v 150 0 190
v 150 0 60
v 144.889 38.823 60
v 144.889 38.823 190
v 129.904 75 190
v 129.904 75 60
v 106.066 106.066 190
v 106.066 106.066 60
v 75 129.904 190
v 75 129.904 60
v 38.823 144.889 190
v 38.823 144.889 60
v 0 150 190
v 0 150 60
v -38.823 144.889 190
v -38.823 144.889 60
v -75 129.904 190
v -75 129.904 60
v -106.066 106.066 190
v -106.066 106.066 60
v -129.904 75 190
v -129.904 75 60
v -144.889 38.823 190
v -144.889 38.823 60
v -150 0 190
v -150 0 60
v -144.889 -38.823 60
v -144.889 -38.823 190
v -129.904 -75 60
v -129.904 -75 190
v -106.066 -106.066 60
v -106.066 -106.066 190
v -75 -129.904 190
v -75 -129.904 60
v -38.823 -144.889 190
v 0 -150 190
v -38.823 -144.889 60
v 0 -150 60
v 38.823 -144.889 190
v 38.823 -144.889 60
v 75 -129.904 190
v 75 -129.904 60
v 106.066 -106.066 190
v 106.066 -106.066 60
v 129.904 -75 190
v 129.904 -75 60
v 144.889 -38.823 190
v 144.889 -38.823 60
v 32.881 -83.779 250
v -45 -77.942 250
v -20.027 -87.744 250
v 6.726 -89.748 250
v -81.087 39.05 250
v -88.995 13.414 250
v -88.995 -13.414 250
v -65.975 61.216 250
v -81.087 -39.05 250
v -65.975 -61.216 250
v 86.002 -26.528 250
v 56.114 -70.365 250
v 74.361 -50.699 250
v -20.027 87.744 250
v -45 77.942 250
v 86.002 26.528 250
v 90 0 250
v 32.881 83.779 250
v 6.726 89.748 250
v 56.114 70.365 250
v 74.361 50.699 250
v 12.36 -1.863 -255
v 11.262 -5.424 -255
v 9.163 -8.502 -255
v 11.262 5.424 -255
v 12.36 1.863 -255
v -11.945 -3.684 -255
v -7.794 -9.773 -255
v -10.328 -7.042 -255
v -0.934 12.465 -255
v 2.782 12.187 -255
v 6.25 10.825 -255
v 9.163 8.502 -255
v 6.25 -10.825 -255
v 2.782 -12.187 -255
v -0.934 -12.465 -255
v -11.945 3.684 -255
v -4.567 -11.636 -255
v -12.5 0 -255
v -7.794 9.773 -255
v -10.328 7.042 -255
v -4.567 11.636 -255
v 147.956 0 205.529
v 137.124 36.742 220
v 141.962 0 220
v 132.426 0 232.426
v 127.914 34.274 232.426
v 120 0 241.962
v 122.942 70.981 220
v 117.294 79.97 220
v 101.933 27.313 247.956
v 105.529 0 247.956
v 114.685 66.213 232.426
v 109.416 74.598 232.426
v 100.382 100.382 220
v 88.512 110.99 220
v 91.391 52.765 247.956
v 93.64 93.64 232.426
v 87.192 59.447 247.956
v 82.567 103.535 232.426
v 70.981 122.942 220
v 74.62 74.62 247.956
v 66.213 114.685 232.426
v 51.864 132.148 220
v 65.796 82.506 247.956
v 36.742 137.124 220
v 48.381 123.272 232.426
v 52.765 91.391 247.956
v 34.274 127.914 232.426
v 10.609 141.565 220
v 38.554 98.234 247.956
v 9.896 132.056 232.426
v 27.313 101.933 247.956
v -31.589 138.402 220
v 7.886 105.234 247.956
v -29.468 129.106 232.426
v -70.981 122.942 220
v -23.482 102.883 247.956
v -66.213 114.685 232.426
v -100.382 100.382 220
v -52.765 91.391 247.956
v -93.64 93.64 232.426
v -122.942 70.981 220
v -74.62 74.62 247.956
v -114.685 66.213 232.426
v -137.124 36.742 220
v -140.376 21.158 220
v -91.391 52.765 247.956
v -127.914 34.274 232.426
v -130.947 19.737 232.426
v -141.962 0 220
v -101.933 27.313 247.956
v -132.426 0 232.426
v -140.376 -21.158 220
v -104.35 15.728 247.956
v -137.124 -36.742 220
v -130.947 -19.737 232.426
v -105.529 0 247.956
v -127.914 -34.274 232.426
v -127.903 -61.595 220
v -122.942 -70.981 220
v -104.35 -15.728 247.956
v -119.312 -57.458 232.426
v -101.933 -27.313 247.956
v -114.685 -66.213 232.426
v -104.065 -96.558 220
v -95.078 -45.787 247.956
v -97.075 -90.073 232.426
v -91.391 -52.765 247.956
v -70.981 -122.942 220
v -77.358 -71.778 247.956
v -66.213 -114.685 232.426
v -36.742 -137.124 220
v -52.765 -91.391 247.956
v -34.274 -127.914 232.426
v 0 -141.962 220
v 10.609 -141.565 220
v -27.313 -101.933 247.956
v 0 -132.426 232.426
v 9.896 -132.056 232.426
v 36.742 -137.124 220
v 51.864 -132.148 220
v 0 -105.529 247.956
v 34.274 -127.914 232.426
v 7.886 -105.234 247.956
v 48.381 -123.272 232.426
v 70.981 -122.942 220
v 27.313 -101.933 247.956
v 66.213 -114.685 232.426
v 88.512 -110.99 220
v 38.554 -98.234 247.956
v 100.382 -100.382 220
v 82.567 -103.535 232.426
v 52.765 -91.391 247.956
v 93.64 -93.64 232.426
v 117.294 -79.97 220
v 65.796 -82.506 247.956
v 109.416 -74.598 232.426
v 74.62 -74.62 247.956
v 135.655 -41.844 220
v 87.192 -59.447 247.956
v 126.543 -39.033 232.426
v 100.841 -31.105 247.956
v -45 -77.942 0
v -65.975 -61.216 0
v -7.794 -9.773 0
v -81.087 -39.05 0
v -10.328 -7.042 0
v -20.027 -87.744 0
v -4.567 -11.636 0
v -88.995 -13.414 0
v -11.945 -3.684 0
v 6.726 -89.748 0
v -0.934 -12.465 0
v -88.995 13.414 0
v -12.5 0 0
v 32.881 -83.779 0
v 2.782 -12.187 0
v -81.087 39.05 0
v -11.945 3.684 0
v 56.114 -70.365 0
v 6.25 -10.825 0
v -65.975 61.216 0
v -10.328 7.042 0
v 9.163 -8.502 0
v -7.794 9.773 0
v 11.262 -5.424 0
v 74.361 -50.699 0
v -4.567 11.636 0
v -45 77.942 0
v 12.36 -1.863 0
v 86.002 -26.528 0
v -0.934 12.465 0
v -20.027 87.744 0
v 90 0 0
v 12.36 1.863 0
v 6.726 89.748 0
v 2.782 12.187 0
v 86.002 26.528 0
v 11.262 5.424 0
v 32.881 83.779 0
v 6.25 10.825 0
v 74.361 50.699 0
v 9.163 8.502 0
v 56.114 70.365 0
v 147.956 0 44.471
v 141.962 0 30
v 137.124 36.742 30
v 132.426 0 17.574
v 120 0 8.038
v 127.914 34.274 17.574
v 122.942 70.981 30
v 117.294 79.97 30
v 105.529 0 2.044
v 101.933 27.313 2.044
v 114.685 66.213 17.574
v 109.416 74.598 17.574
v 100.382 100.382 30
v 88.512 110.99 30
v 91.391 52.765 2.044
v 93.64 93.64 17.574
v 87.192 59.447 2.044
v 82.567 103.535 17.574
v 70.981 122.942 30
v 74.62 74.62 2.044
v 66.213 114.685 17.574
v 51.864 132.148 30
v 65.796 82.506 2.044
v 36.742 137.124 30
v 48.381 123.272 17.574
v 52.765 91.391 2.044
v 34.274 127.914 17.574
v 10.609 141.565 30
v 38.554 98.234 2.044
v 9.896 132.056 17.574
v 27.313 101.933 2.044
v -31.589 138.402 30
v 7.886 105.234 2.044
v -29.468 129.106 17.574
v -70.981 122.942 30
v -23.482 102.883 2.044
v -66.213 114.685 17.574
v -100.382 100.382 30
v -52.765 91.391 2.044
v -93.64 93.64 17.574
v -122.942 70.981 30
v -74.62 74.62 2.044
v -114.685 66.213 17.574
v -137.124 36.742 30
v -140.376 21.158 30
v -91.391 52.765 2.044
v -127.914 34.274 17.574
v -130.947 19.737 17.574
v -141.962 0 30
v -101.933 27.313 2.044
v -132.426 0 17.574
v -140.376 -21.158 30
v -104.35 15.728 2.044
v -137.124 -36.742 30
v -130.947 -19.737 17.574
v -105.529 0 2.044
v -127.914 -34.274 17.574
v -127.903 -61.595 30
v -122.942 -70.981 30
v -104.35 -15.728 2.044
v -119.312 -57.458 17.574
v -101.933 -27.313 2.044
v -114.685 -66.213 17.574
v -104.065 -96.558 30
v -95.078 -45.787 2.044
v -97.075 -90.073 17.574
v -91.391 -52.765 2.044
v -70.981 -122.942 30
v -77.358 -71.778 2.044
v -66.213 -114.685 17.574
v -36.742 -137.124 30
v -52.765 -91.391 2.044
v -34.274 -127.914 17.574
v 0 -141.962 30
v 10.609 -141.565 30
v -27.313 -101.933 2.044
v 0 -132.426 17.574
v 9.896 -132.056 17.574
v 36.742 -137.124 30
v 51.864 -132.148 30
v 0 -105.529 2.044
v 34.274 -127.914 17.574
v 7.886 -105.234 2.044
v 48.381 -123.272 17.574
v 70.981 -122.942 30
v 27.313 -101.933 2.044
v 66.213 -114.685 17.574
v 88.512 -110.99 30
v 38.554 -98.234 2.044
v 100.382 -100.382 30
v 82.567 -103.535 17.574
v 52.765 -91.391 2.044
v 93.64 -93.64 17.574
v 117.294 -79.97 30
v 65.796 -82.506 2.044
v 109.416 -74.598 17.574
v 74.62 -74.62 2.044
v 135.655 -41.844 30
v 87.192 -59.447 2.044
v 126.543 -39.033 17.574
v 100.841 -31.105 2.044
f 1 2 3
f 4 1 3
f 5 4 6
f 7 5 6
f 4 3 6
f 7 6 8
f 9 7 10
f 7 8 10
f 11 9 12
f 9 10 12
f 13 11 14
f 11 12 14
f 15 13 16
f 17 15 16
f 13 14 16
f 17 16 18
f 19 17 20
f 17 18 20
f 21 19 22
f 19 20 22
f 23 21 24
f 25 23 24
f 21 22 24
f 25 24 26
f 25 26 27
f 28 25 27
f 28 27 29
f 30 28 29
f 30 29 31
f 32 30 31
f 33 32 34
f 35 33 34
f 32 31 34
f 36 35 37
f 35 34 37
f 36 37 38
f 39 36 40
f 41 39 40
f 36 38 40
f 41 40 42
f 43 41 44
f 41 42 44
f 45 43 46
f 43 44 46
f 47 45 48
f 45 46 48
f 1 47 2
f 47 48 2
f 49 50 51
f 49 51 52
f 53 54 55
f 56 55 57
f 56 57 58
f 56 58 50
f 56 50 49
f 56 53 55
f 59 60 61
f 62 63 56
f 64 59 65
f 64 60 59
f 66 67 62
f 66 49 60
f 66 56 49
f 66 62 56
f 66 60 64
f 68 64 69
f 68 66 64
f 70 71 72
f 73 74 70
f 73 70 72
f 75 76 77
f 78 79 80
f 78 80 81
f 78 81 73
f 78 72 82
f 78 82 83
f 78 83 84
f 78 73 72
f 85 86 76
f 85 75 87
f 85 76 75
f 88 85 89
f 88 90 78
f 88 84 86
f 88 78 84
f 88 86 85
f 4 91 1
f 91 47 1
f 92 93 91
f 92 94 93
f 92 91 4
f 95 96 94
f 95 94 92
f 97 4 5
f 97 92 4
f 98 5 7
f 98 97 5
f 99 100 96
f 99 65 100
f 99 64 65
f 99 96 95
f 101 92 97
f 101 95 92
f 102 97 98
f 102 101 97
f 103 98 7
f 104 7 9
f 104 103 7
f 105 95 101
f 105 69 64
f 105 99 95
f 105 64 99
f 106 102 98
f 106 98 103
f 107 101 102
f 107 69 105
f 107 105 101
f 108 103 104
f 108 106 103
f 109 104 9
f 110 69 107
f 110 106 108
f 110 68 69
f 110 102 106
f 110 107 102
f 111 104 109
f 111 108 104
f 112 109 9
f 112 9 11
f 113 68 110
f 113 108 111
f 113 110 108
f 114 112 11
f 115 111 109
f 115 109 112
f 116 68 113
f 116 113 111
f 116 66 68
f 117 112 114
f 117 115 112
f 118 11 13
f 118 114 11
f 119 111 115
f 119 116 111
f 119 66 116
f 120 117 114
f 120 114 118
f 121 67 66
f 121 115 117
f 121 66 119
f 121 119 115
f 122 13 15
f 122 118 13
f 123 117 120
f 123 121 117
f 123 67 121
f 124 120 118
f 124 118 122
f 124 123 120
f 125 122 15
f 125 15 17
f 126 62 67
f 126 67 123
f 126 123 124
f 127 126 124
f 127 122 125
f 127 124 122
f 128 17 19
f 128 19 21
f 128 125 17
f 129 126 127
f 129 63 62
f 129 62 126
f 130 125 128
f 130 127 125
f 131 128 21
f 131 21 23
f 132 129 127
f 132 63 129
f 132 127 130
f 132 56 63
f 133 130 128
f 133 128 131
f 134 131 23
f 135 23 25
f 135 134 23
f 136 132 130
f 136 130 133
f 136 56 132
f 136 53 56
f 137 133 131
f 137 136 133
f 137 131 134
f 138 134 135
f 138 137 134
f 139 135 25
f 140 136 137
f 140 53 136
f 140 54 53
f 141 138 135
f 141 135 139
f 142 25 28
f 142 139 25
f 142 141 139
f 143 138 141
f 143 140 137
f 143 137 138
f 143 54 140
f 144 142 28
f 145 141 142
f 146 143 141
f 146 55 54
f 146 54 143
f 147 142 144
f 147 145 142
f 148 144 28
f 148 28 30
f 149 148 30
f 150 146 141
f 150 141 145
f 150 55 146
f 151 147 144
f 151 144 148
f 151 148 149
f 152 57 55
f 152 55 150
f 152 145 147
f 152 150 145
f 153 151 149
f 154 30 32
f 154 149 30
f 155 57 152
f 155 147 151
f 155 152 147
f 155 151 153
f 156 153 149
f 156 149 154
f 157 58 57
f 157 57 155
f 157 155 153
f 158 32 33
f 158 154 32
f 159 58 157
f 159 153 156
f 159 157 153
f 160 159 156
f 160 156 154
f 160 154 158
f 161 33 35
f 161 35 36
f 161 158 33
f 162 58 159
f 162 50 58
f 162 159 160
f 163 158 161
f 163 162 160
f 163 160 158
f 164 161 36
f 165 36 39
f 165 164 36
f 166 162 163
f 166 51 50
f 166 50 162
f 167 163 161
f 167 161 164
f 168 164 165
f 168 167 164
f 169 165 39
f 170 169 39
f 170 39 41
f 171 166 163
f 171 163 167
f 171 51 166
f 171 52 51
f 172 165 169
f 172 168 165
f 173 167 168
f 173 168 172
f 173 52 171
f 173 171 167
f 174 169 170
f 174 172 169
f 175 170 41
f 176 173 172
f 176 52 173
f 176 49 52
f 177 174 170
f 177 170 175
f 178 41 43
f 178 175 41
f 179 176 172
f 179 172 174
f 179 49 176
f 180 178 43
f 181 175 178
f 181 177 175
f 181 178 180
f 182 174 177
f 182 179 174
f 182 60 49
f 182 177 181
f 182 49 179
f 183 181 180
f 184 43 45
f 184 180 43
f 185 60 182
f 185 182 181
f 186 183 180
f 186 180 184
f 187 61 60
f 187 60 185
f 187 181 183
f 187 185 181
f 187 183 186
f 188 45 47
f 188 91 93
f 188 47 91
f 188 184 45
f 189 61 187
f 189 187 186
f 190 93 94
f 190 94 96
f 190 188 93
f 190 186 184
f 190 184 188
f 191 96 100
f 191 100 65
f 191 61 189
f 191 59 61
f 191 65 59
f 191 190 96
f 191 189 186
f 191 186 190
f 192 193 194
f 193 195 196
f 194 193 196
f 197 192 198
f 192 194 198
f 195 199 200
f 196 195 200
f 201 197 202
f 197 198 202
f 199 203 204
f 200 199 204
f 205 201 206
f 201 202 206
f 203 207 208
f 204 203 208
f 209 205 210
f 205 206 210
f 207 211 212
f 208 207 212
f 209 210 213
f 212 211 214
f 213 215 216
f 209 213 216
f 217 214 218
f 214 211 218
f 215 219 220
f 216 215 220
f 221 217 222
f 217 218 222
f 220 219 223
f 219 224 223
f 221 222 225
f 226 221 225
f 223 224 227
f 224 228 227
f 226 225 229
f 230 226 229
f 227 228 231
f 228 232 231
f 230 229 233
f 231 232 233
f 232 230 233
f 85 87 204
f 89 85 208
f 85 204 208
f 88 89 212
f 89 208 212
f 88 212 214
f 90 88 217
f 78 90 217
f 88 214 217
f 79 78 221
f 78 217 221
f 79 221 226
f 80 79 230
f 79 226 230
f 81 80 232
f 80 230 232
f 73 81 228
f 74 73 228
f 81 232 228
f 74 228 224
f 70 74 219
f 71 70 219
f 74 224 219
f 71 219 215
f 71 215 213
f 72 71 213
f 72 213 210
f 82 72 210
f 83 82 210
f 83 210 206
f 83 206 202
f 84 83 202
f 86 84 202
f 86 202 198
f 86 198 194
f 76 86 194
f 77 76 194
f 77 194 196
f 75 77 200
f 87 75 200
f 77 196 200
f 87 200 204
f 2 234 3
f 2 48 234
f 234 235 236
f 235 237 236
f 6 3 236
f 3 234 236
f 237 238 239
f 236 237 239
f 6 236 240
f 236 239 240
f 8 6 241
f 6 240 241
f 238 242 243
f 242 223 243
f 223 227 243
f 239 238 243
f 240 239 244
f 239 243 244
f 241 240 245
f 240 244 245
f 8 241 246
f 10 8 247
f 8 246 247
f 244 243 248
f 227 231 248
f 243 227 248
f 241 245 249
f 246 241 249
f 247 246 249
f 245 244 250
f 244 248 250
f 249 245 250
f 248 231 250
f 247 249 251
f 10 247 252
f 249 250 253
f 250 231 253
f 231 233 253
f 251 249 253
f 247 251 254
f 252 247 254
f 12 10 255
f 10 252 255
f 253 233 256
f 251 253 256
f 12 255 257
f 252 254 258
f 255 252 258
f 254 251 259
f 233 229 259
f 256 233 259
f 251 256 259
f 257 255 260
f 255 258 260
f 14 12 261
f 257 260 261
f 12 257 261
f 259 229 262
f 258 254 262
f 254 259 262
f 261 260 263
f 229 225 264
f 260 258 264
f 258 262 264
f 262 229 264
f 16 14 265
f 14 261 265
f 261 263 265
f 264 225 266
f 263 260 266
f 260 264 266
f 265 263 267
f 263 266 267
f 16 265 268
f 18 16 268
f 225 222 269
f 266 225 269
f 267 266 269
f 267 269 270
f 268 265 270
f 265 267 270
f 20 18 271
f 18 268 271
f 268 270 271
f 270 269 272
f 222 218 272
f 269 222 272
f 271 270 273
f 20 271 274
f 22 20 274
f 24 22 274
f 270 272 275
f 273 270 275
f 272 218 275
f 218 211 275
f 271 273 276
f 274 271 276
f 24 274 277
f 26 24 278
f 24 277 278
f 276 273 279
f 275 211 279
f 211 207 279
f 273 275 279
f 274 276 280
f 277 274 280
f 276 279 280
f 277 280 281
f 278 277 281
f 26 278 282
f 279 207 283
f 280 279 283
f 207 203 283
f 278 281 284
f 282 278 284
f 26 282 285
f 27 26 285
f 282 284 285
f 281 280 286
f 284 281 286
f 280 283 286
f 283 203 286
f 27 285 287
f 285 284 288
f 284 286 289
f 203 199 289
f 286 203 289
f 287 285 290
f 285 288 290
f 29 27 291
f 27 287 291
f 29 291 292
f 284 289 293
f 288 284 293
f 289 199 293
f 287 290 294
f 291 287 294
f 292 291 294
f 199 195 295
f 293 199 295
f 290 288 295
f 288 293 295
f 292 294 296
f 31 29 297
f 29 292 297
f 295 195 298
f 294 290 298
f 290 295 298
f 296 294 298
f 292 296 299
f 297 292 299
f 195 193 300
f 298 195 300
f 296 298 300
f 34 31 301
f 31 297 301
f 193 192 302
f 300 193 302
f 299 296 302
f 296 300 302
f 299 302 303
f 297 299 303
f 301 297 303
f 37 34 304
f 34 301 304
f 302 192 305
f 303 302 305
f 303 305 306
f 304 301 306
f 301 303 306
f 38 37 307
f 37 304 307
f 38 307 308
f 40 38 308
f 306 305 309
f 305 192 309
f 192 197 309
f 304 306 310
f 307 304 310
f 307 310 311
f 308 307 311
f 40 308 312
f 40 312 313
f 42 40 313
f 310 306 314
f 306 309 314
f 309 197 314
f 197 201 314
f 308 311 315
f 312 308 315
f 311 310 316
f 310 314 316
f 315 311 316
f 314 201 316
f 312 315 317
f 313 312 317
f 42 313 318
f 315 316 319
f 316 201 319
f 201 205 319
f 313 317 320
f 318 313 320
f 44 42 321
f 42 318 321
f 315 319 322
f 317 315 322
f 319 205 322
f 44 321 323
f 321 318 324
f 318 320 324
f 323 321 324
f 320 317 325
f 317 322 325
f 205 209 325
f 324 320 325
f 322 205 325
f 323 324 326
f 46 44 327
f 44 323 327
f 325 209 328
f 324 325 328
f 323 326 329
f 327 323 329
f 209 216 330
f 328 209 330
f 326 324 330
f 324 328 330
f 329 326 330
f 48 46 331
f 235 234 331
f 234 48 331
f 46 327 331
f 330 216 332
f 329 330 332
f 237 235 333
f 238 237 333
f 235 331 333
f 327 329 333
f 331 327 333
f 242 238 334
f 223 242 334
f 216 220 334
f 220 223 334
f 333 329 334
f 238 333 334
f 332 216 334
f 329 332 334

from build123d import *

# Parameters (mm, degrees)
SKETCH2_R           = 150
BOSS_EXTRUDE1_DEPTH = 250
SKETCH3_R           = 12.5
BOSS_EXTRUDE2_DEPTH = 255
FILLET1_R           = 60


with BuildPart() as part:
    # Sketch2 → Boss-Extrude1 (new body)
    with BuildSketch(Plane.XY):
        Circle(SKETCH2_R)
    extrude(amount=BOSS_EXTRUDE1_DEPTH)

    # Sketch3 → Boss-Extrude2 (add)
    with BuildSketch(Plane(origin=(0, 0, 0), x_dir=(-1, 0, 0), z_dir=(0, 0, -1))):
        Circle(SKETCH3_R)
    extrude(amount=BOSS_EXTRUDE2_DEPTH)

    # Fillet1
    fillet1_edges = [part.edges().sort_by_distance(p)[0] for p in [
        (-150, 0, 0),
        (-150, 0, 250),
    ]]
    fillet(fillet1_edges, radius=FILLET1_R)


solid = part.part
